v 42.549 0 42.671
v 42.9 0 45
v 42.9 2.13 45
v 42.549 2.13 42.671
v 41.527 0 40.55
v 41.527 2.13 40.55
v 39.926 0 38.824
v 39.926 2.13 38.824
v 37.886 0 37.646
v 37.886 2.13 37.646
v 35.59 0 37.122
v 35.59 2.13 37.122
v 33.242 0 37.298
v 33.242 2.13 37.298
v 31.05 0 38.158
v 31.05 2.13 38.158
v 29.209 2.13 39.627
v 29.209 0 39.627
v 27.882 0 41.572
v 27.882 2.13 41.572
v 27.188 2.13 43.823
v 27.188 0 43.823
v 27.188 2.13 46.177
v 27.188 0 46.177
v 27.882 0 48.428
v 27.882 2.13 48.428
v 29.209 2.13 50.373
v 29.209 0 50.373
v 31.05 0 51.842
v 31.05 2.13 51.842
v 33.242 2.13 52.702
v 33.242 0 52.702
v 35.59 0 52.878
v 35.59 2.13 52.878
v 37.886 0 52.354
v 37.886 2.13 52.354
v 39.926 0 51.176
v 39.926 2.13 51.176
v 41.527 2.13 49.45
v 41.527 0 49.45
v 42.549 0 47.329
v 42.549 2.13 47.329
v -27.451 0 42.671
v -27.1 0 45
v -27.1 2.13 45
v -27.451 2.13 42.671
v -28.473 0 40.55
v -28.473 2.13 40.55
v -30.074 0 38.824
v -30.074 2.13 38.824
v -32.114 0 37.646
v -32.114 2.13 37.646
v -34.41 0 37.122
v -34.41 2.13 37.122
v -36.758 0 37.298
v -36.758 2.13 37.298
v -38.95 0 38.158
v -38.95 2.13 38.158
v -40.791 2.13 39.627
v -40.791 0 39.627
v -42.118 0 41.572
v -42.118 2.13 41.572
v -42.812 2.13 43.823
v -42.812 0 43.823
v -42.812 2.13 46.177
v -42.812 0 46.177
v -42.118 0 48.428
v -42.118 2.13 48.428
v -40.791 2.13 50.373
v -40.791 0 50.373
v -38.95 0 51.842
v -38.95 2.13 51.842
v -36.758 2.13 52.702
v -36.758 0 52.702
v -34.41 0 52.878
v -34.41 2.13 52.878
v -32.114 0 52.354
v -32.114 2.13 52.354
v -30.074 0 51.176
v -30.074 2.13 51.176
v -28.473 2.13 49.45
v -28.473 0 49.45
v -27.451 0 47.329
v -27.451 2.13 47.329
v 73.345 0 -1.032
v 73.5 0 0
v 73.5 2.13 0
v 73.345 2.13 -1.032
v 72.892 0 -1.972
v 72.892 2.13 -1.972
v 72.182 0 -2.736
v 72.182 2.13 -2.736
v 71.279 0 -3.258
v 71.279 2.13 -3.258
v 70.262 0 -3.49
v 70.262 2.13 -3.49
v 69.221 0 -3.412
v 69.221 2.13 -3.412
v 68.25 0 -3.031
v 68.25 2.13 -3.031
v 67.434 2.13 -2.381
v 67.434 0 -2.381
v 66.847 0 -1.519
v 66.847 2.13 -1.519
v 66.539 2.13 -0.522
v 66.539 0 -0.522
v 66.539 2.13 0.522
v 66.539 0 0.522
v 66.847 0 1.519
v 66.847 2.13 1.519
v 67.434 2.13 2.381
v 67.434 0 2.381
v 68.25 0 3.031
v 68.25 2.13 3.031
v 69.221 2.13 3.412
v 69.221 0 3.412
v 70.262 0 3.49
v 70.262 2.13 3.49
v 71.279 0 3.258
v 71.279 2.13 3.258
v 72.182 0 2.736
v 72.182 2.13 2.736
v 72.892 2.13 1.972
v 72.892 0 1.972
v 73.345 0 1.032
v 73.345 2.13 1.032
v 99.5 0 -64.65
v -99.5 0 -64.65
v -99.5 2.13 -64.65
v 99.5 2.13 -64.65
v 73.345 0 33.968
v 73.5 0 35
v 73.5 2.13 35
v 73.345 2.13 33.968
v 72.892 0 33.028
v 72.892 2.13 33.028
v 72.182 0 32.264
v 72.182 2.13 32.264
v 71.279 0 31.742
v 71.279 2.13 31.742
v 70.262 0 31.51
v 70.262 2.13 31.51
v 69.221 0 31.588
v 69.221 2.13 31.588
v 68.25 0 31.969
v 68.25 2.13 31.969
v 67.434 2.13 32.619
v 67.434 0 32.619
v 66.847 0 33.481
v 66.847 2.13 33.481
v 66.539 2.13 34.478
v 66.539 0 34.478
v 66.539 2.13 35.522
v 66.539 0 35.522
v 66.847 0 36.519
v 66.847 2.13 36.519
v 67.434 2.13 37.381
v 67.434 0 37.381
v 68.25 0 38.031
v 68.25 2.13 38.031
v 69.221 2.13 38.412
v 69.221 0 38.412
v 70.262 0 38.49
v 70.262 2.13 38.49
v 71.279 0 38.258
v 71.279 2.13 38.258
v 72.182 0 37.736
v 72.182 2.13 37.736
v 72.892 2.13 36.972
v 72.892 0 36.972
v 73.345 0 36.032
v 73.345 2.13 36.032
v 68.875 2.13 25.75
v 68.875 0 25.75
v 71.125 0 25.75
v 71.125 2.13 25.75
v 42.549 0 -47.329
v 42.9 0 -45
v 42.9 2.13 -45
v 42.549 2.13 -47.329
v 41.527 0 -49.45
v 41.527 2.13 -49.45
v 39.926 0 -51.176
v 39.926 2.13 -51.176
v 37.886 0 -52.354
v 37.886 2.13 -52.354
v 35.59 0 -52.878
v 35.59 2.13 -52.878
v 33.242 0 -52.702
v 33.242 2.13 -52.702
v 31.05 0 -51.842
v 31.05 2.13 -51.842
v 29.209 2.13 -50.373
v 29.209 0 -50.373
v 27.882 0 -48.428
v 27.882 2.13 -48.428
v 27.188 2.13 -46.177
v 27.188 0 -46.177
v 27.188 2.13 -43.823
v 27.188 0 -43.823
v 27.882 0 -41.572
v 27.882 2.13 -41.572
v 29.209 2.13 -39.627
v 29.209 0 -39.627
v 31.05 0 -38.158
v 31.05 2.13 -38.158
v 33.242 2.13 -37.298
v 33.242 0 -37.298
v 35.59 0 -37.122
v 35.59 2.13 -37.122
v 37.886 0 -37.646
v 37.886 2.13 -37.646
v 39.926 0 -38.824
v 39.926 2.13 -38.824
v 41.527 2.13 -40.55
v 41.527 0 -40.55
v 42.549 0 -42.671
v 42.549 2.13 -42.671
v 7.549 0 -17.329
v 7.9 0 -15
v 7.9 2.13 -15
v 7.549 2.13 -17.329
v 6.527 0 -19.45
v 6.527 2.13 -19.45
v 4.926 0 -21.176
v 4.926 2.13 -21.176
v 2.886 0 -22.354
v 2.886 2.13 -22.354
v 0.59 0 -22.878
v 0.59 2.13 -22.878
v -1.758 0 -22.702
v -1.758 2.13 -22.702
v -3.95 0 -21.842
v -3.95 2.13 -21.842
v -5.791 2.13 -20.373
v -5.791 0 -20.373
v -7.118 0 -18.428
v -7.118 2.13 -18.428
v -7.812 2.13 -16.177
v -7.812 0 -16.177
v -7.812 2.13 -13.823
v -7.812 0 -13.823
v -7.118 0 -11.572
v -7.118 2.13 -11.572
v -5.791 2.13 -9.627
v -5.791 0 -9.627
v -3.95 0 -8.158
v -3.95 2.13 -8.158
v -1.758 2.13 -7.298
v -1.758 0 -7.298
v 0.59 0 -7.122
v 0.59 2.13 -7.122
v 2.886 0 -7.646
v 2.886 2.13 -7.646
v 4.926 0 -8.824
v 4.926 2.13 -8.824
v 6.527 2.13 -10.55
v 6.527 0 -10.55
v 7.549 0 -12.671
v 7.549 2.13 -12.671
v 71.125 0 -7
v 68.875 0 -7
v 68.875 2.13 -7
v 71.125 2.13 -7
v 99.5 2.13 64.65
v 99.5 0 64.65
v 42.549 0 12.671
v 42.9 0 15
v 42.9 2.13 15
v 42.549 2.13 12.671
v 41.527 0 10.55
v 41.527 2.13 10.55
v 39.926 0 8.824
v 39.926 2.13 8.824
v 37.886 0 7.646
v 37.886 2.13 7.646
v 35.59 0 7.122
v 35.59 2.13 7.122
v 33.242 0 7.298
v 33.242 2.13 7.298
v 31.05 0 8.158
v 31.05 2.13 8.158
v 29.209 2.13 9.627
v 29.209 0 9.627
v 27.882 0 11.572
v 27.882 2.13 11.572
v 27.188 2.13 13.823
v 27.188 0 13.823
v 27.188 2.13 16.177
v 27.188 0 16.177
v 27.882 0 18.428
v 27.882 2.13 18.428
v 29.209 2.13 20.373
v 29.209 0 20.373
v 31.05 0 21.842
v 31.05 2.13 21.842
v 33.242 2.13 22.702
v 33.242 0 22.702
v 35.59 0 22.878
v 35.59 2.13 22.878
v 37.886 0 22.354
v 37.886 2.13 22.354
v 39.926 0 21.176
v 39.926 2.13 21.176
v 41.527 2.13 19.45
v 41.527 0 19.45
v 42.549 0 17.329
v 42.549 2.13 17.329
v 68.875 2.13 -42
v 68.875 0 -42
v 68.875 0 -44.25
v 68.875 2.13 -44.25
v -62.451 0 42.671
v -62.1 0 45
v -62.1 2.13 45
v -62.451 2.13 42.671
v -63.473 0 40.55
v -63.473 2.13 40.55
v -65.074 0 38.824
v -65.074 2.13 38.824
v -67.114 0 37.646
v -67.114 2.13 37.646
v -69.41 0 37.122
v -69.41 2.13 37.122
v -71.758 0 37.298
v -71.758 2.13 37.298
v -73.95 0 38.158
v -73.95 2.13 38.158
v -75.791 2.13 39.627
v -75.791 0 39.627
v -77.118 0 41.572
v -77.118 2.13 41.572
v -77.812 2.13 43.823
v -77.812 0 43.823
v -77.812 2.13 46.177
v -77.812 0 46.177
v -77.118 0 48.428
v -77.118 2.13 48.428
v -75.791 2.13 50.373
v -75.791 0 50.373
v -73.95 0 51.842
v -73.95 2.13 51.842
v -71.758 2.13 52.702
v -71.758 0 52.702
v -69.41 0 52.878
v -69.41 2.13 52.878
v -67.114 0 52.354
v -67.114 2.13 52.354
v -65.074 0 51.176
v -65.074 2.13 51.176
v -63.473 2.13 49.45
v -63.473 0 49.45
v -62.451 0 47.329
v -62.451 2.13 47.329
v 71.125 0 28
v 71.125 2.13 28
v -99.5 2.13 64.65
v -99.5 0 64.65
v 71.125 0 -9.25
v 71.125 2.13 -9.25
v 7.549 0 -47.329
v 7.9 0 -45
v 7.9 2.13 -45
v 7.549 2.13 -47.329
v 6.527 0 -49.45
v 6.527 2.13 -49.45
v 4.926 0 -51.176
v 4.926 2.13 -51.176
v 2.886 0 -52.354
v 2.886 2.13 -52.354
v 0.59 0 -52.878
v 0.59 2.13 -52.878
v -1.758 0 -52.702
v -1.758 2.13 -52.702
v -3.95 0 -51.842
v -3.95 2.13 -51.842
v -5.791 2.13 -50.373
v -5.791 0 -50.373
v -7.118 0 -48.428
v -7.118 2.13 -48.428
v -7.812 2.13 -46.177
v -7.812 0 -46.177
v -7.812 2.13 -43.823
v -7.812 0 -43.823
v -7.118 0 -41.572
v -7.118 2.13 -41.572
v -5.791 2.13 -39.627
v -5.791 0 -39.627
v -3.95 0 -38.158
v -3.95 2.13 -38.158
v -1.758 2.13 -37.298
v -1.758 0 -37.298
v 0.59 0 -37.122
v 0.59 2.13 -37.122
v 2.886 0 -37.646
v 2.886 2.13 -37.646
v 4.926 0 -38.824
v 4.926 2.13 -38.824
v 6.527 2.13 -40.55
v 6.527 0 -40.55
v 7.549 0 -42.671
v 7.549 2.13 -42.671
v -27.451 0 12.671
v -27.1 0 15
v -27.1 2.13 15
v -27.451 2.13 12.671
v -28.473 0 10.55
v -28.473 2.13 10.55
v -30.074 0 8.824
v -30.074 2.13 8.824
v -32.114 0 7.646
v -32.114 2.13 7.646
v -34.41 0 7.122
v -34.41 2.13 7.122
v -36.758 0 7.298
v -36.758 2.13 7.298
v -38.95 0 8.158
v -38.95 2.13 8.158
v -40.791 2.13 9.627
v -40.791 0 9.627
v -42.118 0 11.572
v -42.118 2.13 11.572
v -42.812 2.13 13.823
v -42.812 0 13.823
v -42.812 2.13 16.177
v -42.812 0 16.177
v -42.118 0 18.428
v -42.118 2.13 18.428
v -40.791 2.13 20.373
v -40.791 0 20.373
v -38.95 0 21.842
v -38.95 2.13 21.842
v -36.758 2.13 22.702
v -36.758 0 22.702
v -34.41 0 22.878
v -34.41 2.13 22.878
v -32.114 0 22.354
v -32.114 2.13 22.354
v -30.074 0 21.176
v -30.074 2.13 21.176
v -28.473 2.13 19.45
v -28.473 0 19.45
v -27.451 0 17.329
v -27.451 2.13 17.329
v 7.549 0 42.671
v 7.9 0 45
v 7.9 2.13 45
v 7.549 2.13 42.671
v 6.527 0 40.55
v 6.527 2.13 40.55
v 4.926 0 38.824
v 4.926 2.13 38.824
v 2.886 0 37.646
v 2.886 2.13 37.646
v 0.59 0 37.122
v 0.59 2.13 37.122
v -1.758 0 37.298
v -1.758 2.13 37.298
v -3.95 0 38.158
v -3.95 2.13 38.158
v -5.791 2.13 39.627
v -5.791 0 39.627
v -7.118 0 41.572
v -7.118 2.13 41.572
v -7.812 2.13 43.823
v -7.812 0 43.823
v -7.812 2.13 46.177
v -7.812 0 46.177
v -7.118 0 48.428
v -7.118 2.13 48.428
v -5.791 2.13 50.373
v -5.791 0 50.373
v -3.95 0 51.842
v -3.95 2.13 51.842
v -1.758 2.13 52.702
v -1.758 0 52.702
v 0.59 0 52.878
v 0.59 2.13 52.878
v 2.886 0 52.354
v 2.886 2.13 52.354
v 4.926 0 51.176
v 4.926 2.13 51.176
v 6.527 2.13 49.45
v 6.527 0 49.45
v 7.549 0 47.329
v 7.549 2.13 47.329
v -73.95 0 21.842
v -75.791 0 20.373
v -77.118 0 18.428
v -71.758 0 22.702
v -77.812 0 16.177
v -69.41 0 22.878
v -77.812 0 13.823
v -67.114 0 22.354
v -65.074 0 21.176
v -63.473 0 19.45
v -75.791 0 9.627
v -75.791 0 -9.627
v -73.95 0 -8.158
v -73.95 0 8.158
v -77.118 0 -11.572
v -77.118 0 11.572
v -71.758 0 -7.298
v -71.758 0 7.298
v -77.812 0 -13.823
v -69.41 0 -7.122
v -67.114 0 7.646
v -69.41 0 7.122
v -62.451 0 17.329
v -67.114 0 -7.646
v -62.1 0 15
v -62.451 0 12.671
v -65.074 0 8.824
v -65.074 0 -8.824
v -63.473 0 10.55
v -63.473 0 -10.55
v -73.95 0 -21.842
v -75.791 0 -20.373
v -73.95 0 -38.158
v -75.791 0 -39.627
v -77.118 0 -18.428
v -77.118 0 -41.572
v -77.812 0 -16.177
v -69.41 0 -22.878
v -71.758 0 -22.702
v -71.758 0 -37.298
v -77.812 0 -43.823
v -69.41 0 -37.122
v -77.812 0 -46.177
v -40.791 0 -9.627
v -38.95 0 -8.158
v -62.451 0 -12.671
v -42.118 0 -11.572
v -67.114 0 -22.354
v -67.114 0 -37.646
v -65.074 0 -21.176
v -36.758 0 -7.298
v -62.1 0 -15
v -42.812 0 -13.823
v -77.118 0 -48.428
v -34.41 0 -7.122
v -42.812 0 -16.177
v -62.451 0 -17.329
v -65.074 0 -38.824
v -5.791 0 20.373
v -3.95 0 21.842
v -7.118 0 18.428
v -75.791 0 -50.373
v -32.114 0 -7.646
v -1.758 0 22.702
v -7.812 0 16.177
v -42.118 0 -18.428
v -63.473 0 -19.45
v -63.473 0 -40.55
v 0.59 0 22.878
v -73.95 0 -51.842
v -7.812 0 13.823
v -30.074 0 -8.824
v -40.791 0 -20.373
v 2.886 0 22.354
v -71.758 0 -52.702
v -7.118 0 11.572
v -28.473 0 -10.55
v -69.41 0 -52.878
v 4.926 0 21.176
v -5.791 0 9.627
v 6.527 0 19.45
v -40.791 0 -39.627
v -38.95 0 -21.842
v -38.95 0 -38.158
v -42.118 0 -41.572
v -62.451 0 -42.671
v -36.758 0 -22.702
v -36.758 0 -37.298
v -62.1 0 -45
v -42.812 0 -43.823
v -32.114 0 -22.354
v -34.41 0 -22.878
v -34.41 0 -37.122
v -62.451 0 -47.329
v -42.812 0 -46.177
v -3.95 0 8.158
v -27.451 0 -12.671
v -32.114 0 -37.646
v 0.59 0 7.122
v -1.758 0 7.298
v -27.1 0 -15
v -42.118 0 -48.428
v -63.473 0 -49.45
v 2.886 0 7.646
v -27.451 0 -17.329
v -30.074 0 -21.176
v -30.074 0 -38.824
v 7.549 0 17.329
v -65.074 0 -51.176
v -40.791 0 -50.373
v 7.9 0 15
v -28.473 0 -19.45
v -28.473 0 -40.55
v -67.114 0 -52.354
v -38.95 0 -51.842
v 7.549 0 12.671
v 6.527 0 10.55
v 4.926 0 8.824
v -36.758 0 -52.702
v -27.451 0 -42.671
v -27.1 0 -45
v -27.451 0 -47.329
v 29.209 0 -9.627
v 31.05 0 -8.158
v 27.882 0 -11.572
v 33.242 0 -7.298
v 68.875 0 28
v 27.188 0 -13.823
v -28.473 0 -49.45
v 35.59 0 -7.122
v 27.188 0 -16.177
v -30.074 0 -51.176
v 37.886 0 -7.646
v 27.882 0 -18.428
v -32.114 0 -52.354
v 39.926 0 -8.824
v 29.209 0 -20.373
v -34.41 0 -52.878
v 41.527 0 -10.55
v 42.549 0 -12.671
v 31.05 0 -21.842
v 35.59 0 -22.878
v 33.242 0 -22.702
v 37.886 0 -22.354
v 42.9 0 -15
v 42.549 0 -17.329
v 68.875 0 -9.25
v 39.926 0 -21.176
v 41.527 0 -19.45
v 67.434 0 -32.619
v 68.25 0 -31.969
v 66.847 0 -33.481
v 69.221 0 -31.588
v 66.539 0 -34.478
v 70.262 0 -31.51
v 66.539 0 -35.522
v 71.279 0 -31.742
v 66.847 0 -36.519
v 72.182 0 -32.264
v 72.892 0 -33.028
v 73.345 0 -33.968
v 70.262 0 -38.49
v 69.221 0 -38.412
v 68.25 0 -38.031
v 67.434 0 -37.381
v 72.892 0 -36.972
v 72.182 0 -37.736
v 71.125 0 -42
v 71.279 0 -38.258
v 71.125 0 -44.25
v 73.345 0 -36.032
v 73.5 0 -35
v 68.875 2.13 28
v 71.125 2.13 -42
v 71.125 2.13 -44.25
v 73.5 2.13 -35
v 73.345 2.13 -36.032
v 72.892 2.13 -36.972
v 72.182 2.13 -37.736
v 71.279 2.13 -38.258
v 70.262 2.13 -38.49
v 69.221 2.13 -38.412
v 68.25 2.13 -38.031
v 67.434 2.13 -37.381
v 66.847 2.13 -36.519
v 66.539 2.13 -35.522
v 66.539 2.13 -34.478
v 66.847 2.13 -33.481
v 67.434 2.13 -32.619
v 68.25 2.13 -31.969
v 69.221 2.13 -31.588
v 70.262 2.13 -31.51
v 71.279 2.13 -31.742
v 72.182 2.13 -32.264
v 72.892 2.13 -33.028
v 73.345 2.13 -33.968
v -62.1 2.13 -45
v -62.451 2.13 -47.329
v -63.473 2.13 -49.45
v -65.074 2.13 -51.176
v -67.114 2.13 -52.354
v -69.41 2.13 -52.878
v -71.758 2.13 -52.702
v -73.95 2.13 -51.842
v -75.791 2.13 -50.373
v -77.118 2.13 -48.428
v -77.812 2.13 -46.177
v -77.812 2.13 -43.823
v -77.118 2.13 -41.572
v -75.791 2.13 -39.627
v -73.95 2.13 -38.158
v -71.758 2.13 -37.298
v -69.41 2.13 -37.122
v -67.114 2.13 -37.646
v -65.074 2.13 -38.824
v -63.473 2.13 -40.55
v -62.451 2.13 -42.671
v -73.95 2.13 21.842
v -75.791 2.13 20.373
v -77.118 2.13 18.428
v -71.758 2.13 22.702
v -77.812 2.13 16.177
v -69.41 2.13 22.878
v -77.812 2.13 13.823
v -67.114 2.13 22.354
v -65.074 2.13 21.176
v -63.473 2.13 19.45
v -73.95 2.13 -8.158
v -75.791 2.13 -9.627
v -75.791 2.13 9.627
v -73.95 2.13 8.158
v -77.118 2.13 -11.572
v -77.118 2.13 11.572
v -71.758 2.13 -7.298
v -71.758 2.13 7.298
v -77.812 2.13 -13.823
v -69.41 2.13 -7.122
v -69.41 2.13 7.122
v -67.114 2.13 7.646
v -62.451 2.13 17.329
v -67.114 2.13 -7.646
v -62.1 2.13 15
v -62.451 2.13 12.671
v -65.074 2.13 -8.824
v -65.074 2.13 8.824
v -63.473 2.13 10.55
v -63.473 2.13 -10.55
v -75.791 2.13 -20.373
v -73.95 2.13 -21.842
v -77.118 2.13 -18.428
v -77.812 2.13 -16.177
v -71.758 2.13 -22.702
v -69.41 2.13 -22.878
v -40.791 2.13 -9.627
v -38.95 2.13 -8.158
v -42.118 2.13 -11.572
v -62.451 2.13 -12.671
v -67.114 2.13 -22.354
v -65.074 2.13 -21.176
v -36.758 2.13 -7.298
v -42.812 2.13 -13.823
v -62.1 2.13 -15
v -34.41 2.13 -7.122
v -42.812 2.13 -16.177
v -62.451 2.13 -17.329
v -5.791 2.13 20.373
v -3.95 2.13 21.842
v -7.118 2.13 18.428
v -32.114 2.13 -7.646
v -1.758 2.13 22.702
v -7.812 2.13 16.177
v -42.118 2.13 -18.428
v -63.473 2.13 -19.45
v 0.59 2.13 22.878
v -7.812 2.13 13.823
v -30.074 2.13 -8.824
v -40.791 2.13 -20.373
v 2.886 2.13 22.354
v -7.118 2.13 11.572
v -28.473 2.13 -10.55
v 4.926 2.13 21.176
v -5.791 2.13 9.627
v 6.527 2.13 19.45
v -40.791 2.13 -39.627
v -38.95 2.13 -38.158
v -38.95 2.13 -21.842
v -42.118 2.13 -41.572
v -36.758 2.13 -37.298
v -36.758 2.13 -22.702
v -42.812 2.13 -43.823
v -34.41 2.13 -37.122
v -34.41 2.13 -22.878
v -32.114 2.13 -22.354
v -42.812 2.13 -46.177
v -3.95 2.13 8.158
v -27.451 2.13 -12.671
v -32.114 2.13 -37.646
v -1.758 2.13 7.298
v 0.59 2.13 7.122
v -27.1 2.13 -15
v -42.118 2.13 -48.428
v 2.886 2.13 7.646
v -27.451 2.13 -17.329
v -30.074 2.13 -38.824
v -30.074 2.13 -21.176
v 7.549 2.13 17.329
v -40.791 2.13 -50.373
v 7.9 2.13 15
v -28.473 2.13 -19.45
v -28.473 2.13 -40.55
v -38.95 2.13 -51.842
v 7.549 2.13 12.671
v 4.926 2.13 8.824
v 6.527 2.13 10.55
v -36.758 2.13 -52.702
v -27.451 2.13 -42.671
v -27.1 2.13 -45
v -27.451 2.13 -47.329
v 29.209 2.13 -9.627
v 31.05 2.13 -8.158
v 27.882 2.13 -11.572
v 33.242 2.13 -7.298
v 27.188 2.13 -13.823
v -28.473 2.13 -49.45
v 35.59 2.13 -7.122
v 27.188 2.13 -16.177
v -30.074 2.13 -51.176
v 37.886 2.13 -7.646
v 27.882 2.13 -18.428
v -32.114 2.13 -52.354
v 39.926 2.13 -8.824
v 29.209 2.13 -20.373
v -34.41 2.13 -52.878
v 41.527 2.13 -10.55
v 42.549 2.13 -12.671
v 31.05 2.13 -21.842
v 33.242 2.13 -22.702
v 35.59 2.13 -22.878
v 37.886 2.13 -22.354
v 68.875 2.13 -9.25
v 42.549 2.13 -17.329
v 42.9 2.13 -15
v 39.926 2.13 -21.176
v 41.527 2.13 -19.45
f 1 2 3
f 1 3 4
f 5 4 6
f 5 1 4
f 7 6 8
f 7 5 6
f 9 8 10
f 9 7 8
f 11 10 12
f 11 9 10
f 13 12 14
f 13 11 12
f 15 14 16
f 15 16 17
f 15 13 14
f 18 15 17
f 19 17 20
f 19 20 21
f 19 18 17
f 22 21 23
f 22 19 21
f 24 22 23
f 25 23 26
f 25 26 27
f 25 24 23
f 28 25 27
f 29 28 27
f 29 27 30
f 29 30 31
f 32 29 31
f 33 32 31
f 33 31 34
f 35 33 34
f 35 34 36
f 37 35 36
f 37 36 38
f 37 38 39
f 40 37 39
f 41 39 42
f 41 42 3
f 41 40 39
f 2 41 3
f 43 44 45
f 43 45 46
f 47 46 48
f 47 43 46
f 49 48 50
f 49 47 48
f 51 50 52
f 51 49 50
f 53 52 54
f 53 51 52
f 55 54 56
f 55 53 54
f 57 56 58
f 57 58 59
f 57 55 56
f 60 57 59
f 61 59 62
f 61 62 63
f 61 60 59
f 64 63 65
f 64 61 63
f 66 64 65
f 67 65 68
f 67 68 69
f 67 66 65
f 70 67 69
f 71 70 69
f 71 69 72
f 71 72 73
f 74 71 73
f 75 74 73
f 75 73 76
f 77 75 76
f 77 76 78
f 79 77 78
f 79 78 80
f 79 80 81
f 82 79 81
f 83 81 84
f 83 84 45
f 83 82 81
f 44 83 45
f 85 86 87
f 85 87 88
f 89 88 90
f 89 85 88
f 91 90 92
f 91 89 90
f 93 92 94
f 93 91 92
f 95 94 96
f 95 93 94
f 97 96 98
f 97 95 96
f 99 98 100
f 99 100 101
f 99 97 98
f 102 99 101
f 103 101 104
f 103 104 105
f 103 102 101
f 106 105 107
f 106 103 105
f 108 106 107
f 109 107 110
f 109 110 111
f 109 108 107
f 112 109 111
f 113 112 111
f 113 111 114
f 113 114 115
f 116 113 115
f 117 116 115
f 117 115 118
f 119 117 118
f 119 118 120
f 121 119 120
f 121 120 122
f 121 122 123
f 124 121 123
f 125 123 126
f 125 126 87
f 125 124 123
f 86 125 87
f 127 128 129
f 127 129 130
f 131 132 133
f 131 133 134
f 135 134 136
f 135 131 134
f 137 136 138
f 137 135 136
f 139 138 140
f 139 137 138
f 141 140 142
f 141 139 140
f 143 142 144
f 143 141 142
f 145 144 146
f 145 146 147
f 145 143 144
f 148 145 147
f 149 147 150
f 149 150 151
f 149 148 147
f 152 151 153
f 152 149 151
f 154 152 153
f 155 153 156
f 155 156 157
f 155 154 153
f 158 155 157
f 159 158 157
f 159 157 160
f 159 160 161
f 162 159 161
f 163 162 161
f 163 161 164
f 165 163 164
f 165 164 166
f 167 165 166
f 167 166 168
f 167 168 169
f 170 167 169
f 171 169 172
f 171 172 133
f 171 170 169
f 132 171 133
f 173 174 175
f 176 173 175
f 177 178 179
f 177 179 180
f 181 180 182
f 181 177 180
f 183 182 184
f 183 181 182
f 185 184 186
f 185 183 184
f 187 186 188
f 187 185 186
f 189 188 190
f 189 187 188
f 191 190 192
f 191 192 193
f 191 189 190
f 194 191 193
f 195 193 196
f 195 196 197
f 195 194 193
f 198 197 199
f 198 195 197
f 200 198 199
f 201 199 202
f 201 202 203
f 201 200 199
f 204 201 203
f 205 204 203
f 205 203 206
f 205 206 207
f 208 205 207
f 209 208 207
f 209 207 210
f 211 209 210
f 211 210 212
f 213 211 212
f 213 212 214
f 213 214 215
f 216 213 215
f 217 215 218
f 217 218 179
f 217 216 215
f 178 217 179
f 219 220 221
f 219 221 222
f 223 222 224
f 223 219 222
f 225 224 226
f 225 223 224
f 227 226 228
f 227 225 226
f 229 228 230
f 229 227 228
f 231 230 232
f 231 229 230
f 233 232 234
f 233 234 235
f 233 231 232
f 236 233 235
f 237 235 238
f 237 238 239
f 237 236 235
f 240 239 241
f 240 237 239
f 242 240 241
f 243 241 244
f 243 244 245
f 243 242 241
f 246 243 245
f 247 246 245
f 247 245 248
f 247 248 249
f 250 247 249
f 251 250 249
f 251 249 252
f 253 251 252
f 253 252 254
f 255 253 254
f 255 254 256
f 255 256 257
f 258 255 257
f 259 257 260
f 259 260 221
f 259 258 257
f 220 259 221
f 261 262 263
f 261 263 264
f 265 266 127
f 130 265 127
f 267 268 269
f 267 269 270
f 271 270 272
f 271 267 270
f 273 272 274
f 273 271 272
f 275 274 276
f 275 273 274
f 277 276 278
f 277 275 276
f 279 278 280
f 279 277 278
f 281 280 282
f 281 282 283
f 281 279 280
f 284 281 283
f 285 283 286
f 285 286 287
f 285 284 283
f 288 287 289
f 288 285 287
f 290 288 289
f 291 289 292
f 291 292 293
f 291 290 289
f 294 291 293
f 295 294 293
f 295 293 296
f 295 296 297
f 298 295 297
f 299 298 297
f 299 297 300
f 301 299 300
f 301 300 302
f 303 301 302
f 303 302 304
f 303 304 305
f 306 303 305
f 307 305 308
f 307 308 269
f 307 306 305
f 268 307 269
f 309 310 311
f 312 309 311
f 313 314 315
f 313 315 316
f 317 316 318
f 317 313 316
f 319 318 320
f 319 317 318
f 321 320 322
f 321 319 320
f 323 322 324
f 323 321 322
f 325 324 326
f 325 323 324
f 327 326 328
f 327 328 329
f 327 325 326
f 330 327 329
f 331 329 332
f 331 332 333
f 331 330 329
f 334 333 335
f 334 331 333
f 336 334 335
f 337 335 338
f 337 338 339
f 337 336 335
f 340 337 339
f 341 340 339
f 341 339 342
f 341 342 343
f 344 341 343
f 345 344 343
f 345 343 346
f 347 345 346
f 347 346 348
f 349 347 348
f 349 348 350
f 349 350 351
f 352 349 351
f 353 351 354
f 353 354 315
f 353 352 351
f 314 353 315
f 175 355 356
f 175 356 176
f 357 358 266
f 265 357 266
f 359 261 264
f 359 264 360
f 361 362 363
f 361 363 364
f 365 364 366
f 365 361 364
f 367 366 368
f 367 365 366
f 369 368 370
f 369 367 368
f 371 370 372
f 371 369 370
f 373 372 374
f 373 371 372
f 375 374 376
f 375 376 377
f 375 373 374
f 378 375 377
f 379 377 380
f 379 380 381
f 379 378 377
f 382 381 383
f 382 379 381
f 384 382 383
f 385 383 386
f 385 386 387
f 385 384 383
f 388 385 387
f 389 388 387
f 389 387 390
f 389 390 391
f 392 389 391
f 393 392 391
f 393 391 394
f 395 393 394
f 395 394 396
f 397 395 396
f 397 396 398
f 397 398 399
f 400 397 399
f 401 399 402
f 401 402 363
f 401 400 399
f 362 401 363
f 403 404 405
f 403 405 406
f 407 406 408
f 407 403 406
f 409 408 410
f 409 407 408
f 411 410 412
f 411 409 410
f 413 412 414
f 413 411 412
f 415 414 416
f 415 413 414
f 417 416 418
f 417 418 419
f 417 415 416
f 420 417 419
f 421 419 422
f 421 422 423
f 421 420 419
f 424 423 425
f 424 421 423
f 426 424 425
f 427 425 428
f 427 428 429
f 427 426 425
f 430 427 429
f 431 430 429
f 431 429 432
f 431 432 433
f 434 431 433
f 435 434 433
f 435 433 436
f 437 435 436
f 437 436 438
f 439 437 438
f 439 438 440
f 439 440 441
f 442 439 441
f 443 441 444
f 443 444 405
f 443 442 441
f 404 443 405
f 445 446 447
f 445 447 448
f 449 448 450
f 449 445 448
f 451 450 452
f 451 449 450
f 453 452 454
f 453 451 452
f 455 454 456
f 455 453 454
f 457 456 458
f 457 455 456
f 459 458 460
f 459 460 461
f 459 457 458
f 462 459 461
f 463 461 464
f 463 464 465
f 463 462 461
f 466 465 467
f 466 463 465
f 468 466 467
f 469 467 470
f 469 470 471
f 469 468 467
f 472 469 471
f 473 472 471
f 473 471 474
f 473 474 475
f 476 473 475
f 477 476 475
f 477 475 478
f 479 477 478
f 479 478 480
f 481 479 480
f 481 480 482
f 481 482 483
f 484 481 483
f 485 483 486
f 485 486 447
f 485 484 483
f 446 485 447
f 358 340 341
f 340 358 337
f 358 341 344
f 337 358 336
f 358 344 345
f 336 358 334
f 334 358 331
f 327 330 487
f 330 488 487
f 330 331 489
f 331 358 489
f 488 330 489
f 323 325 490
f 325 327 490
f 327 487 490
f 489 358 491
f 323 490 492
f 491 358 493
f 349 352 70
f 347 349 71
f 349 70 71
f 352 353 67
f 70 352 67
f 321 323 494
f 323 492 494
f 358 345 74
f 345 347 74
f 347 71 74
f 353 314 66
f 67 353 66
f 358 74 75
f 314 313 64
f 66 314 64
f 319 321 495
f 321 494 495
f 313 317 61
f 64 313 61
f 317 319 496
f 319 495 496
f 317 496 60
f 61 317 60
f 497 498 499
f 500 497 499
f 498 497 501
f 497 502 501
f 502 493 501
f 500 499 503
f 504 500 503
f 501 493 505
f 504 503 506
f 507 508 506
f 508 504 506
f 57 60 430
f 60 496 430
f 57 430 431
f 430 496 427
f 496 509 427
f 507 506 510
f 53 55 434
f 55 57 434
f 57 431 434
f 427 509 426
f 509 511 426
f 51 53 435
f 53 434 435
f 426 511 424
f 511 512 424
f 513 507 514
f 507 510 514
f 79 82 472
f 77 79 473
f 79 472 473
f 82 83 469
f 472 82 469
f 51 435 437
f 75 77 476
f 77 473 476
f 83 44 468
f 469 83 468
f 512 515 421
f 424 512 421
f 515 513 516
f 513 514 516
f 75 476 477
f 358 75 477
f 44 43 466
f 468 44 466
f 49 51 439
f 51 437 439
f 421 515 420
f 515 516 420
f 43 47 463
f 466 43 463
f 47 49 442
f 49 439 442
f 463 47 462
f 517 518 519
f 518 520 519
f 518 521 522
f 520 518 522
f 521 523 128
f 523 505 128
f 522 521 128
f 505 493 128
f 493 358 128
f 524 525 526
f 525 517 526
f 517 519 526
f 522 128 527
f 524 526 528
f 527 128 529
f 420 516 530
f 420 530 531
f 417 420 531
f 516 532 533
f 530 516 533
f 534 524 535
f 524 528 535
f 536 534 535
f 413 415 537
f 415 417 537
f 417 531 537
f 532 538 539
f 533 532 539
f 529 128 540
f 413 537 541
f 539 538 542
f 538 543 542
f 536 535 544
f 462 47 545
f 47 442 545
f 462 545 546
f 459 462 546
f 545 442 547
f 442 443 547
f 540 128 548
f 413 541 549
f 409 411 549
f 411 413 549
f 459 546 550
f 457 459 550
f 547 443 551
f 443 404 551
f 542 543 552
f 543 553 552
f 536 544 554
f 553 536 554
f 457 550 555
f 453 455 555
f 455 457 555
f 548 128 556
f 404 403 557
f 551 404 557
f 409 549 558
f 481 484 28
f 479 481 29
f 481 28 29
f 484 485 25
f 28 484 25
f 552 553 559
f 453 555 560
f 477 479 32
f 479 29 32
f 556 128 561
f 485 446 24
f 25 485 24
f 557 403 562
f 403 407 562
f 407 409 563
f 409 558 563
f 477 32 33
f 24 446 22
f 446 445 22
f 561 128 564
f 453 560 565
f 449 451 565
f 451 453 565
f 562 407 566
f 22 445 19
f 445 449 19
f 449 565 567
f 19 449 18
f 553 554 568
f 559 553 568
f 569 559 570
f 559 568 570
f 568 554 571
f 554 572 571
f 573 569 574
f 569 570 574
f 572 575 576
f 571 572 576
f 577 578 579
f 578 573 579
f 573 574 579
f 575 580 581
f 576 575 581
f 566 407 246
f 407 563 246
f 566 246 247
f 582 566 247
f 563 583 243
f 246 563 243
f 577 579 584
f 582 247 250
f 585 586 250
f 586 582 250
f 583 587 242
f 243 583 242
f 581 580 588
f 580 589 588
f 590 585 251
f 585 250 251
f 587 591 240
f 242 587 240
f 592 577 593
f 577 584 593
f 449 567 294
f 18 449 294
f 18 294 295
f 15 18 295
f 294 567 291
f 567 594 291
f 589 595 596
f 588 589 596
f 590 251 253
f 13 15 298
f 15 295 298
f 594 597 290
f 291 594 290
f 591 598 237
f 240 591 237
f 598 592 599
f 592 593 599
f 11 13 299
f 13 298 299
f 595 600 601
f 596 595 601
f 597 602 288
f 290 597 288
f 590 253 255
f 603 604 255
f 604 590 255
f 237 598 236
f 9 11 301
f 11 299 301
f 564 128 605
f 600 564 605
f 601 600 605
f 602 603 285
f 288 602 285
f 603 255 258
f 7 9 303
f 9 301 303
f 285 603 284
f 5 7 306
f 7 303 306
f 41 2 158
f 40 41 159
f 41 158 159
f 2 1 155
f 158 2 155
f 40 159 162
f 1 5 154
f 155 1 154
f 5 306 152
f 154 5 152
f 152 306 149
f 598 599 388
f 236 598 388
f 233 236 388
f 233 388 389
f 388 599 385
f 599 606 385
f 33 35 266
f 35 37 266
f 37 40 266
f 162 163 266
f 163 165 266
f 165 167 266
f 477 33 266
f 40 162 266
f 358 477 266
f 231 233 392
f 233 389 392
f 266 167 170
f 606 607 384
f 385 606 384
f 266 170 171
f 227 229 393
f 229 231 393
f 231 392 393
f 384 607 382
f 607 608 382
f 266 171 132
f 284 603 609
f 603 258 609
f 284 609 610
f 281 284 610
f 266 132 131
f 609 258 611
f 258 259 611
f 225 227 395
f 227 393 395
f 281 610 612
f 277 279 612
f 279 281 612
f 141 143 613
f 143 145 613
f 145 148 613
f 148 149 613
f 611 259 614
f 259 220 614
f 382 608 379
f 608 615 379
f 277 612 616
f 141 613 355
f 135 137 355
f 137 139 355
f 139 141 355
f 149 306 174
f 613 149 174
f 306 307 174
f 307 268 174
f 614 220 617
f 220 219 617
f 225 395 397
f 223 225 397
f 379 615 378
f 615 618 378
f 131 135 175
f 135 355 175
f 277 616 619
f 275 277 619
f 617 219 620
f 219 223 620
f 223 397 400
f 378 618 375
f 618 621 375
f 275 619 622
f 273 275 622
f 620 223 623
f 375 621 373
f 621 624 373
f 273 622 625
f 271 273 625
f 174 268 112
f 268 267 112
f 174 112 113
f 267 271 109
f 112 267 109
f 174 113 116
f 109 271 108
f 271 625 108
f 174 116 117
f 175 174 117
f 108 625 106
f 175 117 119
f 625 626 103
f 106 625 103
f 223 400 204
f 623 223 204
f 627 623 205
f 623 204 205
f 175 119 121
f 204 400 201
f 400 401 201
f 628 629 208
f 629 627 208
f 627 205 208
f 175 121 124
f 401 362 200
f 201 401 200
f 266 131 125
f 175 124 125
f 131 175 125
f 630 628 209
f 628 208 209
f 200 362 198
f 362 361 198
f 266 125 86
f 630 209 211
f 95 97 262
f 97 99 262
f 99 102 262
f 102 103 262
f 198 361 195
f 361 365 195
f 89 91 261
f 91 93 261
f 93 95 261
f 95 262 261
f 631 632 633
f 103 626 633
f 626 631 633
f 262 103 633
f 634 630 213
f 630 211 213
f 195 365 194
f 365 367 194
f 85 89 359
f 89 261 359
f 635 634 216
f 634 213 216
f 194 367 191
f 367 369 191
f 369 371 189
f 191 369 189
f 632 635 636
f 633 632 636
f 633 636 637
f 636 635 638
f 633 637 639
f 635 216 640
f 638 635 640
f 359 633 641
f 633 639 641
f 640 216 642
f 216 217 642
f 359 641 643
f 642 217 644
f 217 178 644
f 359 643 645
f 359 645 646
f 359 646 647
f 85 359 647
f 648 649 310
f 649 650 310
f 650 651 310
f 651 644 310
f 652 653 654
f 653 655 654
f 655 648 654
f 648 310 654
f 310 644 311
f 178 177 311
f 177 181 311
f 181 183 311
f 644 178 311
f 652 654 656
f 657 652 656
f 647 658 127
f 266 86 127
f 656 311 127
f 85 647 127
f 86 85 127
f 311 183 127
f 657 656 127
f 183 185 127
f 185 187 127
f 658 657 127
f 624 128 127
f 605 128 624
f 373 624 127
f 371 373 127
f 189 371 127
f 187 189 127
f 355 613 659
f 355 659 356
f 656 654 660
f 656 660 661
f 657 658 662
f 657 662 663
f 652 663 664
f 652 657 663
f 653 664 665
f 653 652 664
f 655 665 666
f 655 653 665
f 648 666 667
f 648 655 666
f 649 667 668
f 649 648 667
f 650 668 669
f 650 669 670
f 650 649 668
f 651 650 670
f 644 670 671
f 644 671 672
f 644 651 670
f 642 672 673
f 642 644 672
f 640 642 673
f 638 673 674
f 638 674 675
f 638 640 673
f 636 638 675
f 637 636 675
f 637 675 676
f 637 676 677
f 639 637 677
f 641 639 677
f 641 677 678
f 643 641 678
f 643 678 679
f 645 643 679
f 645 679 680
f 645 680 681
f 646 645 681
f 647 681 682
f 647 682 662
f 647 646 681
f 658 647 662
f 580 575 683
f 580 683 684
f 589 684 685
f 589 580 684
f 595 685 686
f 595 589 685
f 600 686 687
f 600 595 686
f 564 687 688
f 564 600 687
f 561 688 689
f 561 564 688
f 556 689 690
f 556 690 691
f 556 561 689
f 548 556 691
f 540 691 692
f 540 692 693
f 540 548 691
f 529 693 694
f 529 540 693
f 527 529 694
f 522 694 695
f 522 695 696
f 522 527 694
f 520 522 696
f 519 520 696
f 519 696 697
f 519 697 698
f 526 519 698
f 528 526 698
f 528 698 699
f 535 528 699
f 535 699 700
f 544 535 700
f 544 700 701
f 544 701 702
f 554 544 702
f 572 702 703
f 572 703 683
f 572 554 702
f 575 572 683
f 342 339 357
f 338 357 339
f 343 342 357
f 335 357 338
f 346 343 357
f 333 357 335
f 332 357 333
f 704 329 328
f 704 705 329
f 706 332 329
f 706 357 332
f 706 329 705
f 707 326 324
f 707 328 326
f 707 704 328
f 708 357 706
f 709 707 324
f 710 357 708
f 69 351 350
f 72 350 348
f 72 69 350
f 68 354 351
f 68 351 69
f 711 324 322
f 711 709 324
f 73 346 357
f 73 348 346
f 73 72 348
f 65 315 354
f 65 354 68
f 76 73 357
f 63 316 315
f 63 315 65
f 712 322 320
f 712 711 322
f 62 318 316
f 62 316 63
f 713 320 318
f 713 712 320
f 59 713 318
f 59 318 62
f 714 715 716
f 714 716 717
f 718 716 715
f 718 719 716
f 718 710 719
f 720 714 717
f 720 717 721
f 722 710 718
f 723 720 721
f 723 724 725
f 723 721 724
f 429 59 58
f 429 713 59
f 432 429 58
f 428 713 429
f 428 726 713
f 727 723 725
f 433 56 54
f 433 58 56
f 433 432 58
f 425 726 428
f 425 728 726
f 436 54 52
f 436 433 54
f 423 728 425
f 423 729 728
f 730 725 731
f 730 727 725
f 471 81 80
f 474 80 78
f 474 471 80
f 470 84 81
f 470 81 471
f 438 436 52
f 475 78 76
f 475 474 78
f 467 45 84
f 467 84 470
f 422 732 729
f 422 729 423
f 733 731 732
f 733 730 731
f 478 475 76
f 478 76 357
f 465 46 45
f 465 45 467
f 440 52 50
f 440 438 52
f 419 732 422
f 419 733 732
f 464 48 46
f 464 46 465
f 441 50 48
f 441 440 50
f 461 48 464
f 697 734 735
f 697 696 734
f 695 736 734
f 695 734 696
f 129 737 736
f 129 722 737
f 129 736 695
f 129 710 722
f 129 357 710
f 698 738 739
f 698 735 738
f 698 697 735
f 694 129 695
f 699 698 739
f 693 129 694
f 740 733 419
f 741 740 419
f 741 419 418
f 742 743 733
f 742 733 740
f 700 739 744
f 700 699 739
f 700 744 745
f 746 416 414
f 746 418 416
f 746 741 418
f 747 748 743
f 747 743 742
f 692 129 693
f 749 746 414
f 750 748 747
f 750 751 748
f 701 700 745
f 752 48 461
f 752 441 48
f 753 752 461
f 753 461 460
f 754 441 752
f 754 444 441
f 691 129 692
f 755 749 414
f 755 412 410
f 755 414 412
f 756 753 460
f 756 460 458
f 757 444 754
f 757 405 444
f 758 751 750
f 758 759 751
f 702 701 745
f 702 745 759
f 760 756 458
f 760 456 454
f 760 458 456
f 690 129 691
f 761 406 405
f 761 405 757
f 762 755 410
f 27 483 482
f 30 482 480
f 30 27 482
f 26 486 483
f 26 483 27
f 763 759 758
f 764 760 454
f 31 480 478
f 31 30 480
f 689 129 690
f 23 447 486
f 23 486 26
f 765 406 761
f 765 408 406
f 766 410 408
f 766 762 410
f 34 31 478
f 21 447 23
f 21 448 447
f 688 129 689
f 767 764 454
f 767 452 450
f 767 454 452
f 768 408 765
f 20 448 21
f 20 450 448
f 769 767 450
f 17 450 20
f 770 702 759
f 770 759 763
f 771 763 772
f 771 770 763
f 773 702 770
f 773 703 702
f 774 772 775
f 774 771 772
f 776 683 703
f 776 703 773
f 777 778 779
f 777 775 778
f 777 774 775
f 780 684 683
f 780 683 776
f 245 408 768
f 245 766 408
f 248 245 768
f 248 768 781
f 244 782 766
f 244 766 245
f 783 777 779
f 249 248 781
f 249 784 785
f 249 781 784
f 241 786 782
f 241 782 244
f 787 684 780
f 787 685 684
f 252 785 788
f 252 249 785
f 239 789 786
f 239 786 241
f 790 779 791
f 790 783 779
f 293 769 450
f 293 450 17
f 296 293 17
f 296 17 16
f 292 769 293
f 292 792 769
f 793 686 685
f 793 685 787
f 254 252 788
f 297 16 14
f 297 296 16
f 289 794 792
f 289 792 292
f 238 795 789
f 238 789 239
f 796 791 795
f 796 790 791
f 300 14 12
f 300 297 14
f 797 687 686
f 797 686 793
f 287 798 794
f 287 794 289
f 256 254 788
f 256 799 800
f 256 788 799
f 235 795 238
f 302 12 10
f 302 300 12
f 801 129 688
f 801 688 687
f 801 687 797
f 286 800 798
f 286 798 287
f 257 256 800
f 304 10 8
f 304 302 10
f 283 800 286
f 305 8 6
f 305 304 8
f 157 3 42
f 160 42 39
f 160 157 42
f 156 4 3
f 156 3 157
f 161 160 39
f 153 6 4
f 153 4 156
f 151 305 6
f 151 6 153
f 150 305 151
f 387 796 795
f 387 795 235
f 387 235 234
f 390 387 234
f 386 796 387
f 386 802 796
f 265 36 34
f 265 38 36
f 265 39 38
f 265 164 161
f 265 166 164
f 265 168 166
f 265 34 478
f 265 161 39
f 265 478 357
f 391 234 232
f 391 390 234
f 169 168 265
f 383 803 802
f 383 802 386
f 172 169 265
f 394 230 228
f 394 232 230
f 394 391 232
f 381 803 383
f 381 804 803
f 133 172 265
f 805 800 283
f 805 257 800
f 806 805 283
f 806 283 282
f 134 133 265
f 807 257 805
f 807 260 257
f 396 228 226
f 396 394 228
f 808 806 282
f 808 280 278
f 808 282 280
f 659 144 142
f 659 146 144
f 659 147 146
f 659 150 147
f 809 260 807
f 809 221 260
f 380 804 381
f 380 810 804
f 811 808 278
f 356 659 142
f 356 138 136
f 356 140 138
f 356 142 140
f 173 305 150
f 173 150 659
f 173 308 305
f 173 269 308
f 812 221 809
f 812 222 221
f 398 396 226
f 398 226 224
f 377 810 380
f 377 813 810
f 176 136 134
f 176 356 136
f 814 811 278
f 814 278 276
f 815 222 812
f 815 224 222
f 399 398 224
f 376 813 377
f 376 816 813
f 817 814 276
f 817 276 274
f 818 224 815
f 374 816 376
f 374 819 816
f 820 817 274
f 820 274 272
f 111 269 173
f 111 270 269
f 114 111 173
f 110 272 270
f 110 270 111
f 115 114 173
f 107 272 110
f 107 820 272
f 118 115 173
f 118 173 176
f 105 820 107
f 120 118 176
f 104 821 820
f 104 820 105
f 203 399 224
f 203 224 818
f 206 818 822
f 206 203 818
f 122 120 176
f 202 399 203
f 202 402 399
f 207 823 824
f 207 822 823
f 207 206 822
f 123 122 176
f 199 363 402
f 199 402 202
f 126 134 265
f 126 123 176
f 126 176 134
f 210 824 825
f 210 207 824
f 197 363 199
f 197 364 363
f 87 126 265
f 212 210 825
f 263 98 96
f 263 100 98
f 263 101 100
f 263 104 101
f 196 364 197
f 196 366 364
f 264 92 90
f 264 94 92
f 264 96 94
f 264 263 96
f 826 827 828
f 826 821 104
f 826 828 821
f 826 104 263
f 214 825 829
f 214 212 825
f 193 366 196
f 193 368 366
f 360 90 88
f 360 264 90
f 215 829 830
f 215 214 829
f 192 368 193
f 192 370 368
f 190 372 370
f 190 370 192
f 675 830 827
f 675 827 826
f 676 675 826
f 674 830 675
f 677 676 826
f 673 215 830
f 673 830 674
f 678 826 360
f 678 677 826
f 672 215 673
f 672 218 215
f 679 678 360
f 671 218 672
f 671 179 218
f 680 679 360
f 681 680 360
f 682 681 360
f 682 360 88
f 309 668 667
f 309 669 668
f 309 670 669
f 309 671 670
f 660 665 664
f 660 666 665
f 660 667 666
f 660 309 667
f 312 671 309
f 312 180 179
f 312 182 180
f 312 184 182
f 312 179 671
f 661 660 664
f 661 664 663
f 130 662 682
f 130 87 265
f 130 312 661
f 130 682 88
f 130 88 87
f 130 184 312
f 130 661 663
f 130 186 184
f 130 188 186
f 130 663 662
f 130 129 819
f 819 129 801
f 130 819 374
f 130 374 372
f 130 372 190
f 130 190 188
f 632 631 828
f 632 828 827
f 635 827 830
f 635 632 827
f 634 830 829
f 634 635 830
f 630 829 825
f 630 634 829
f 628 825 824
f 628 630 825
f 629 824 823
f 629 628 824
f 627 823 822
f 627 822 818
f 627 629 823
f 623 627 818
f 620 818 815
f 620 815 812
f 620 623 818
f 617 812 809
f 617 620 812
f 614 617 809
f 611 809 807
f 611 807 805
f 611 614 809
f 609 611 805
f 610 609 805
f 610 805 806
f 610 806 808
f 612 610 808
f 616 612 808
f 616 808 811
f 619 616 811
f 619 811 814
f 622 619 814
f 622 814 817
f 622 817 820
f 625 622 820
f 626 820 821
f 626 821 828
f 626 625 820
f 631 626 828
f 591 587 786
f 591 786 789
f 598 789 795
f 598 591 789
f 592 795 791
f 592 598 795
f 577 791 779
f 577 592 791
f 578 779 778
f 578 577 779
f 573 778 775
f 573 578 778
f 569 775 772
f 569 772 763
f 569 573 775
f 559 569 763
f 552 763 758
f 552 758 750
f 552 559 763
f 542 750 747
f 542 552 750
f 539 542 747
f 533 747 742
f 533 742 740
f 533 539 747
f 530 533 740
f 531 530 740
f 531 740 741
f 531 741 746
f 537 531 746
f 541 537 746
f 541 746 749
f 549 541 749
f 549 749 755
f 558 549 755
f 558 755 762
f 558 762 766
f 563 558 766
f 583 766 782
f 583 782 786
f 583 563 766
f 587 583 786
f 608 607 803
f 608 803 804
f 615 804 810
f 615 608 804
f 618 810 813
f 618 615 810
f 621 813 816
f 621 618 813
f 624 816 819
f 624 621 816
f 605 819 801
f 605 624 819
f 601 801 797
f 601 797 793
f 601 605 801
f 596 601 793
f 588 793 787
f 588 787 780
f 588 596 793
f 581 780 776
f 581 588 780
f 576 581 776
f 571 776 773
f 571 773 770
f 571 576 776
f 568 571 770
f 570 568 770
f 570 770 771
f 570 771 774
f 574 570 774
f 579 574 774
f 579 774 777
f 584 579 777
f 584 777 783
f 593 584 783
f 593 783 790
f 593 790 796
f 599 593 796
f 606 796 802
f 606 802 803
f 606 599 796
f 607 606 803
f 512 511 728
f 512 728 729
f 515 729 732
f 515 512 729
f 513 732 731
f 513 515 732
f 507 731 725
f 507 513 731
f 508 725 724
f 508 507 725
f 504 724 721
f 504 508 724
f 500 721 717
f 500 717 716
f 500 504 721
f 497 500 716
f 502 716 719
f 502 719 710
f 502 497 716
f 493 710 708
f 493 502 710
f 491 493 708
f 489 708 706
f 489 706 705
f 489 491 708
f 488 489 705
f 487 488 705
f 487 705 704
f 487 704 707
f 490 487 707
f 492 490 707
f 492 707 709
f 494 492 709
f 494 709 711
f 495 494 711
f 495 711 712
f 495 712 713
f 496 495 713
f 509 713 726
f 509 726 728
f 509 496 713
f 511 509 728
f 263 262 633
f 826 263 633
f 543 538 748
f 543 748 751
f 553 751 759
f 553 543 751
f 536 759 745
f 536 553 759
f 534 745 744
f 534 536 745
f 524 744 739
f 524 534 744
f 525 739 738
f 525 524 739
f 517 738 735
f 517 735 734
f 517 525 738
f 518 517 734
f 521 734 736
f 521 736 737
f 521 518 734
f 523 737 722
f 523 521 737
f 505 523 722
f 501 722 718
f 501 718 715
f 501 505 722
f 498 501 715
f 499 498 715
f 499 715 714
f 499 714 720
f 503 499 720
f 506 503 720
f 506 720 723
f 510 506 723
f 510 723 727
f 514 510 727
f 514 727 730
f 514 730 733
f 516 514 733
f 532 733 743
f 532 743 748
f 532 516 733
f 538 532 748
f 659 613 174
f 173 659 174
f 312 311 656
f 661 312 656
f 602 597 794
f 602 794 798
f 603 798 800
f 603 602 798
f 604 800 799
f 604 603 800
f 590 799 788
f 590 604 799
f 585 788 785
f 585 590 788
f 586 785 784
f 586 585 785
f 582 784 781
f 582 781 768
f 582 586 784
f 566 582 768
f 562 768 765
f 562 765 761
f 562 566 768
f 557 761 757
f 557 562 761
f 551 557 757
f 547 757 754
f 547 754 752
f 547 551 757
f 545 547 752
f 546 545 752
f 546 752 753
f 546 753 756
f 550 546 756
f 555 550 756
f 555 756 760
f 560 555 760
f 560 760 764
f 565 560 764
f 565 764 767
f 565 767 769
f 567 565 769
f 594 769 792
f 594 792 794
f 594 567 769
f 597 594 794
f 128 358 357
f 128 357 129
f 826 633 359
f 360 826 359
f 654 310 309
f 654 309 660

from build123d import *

# Parameters (mm, degrees)
SKETCH1_W           = 199
SKETCH1_H           = 129.3
SKETCH1_R           = 7.9
SKETCH1_R_2         = 3.5
SKETCH1_W_2         = 2.25
SKETCH1_H_2         = 2.25
BOSS_EXTRUDE1_DEPTH = 2.13


with BuildPart() as part:
    # Sketch1 → Boss-Extrude1 (new body)
    with BuildSketch(Plane(origin=(0, 0, 0), x_dir=(1, 0, 0), z_dir=(0, 1, 0))):
        Rectangle(SKETCH1_W, SKETCH1_H)
        with Locations((-70, 45)):
            Circle(SKETCH1_R, mode=Mode.SUBTRACT)
        with Locations((-35, 45)):
            Circle(SKETCH1_R, mode=Mode.SUBTRACT)
        with Locations((0, 45)):
            Circle(SKETCH1_R, mode=Mode.SUBTRACT)
        with Locations((35, 45)):
            Circle(SKETCH1_R, mode=Mode.SUBTRACT)
        with Locations((-35, 15)):
            Circle(SKETCH1_R, mode=Mode.SUBTRACT)
        with Locations((0, 15)):
            Circle(SKETCH1_R, mode=Mode.SUBTRACT)
        with Locations((35, 15)):
            Circle(SKETCH1_R, mode=Mode.SUBTRACT)
        with Locations((-35, -15)):
            Circle(SKETCH1_R, mode=Mode.SUBTRACT)
        with Locations((0, -15)):
            Circle(SKETCH1_R, mode=Mode.SUBTRACT)
        with Locations((35, -15)):
            Circle(SKETCH1_R, mode=Mode.SUBTRACT)
        with Locations((-35, -45)):
            Circle(SKETCH1_R, mode=Mode.SUBTRACT)
        with Locations((0, -45)):
            Circle(SKETCH1_R, mode=Mode.SUBTRACT)
        with Locations((35, -45)):
            Circle(SKETCH1_R, mode=Mode.SUBTRACT)
        with Locations((-70, 15)):
            Circle(SKETCH1_R, mode=Mode.SUBTRACT)
        with Locations((-70, -15)):
            Circle(SKETCH1_R, mode=Mode.SUBTRACT)
        with Locations((-70, -45)):
            Circle(SKETCH1_R, mode=Mode.SUBTRACT)
        with Locations((70, 35)):
            Circle(SKETCH1_R_2, mode=Mode.SUBTRACT)
        with Locations((70, 0)):
            Circle(SKETCH1_R_2, mode=Mode.SUBTRACT)
        with Locations((70, -35)):
            Circle(SKETCH1_R_2, mode=Mode.SUBTRACT)
        with Locations((70, 43.125)):
            Rectangle(SKETCH1_W_2, SKETCH1_H_2, mode=Mode.SUBTRACT)
        with Locations((70, 8.125)):
            Rectangle(SKETCH1_W_2, SKETCH1_H_2, mode=Mode.SUBTRACT)
        with Locations((70, -26.875)):
            Rectangle(SKETCH1_W_2, SKETCH1_H_2, mode=Mode.SUBTRACT)
    extrude(amount=BOSS_EXTRUDE1_DEPTH)


solid = part.part
